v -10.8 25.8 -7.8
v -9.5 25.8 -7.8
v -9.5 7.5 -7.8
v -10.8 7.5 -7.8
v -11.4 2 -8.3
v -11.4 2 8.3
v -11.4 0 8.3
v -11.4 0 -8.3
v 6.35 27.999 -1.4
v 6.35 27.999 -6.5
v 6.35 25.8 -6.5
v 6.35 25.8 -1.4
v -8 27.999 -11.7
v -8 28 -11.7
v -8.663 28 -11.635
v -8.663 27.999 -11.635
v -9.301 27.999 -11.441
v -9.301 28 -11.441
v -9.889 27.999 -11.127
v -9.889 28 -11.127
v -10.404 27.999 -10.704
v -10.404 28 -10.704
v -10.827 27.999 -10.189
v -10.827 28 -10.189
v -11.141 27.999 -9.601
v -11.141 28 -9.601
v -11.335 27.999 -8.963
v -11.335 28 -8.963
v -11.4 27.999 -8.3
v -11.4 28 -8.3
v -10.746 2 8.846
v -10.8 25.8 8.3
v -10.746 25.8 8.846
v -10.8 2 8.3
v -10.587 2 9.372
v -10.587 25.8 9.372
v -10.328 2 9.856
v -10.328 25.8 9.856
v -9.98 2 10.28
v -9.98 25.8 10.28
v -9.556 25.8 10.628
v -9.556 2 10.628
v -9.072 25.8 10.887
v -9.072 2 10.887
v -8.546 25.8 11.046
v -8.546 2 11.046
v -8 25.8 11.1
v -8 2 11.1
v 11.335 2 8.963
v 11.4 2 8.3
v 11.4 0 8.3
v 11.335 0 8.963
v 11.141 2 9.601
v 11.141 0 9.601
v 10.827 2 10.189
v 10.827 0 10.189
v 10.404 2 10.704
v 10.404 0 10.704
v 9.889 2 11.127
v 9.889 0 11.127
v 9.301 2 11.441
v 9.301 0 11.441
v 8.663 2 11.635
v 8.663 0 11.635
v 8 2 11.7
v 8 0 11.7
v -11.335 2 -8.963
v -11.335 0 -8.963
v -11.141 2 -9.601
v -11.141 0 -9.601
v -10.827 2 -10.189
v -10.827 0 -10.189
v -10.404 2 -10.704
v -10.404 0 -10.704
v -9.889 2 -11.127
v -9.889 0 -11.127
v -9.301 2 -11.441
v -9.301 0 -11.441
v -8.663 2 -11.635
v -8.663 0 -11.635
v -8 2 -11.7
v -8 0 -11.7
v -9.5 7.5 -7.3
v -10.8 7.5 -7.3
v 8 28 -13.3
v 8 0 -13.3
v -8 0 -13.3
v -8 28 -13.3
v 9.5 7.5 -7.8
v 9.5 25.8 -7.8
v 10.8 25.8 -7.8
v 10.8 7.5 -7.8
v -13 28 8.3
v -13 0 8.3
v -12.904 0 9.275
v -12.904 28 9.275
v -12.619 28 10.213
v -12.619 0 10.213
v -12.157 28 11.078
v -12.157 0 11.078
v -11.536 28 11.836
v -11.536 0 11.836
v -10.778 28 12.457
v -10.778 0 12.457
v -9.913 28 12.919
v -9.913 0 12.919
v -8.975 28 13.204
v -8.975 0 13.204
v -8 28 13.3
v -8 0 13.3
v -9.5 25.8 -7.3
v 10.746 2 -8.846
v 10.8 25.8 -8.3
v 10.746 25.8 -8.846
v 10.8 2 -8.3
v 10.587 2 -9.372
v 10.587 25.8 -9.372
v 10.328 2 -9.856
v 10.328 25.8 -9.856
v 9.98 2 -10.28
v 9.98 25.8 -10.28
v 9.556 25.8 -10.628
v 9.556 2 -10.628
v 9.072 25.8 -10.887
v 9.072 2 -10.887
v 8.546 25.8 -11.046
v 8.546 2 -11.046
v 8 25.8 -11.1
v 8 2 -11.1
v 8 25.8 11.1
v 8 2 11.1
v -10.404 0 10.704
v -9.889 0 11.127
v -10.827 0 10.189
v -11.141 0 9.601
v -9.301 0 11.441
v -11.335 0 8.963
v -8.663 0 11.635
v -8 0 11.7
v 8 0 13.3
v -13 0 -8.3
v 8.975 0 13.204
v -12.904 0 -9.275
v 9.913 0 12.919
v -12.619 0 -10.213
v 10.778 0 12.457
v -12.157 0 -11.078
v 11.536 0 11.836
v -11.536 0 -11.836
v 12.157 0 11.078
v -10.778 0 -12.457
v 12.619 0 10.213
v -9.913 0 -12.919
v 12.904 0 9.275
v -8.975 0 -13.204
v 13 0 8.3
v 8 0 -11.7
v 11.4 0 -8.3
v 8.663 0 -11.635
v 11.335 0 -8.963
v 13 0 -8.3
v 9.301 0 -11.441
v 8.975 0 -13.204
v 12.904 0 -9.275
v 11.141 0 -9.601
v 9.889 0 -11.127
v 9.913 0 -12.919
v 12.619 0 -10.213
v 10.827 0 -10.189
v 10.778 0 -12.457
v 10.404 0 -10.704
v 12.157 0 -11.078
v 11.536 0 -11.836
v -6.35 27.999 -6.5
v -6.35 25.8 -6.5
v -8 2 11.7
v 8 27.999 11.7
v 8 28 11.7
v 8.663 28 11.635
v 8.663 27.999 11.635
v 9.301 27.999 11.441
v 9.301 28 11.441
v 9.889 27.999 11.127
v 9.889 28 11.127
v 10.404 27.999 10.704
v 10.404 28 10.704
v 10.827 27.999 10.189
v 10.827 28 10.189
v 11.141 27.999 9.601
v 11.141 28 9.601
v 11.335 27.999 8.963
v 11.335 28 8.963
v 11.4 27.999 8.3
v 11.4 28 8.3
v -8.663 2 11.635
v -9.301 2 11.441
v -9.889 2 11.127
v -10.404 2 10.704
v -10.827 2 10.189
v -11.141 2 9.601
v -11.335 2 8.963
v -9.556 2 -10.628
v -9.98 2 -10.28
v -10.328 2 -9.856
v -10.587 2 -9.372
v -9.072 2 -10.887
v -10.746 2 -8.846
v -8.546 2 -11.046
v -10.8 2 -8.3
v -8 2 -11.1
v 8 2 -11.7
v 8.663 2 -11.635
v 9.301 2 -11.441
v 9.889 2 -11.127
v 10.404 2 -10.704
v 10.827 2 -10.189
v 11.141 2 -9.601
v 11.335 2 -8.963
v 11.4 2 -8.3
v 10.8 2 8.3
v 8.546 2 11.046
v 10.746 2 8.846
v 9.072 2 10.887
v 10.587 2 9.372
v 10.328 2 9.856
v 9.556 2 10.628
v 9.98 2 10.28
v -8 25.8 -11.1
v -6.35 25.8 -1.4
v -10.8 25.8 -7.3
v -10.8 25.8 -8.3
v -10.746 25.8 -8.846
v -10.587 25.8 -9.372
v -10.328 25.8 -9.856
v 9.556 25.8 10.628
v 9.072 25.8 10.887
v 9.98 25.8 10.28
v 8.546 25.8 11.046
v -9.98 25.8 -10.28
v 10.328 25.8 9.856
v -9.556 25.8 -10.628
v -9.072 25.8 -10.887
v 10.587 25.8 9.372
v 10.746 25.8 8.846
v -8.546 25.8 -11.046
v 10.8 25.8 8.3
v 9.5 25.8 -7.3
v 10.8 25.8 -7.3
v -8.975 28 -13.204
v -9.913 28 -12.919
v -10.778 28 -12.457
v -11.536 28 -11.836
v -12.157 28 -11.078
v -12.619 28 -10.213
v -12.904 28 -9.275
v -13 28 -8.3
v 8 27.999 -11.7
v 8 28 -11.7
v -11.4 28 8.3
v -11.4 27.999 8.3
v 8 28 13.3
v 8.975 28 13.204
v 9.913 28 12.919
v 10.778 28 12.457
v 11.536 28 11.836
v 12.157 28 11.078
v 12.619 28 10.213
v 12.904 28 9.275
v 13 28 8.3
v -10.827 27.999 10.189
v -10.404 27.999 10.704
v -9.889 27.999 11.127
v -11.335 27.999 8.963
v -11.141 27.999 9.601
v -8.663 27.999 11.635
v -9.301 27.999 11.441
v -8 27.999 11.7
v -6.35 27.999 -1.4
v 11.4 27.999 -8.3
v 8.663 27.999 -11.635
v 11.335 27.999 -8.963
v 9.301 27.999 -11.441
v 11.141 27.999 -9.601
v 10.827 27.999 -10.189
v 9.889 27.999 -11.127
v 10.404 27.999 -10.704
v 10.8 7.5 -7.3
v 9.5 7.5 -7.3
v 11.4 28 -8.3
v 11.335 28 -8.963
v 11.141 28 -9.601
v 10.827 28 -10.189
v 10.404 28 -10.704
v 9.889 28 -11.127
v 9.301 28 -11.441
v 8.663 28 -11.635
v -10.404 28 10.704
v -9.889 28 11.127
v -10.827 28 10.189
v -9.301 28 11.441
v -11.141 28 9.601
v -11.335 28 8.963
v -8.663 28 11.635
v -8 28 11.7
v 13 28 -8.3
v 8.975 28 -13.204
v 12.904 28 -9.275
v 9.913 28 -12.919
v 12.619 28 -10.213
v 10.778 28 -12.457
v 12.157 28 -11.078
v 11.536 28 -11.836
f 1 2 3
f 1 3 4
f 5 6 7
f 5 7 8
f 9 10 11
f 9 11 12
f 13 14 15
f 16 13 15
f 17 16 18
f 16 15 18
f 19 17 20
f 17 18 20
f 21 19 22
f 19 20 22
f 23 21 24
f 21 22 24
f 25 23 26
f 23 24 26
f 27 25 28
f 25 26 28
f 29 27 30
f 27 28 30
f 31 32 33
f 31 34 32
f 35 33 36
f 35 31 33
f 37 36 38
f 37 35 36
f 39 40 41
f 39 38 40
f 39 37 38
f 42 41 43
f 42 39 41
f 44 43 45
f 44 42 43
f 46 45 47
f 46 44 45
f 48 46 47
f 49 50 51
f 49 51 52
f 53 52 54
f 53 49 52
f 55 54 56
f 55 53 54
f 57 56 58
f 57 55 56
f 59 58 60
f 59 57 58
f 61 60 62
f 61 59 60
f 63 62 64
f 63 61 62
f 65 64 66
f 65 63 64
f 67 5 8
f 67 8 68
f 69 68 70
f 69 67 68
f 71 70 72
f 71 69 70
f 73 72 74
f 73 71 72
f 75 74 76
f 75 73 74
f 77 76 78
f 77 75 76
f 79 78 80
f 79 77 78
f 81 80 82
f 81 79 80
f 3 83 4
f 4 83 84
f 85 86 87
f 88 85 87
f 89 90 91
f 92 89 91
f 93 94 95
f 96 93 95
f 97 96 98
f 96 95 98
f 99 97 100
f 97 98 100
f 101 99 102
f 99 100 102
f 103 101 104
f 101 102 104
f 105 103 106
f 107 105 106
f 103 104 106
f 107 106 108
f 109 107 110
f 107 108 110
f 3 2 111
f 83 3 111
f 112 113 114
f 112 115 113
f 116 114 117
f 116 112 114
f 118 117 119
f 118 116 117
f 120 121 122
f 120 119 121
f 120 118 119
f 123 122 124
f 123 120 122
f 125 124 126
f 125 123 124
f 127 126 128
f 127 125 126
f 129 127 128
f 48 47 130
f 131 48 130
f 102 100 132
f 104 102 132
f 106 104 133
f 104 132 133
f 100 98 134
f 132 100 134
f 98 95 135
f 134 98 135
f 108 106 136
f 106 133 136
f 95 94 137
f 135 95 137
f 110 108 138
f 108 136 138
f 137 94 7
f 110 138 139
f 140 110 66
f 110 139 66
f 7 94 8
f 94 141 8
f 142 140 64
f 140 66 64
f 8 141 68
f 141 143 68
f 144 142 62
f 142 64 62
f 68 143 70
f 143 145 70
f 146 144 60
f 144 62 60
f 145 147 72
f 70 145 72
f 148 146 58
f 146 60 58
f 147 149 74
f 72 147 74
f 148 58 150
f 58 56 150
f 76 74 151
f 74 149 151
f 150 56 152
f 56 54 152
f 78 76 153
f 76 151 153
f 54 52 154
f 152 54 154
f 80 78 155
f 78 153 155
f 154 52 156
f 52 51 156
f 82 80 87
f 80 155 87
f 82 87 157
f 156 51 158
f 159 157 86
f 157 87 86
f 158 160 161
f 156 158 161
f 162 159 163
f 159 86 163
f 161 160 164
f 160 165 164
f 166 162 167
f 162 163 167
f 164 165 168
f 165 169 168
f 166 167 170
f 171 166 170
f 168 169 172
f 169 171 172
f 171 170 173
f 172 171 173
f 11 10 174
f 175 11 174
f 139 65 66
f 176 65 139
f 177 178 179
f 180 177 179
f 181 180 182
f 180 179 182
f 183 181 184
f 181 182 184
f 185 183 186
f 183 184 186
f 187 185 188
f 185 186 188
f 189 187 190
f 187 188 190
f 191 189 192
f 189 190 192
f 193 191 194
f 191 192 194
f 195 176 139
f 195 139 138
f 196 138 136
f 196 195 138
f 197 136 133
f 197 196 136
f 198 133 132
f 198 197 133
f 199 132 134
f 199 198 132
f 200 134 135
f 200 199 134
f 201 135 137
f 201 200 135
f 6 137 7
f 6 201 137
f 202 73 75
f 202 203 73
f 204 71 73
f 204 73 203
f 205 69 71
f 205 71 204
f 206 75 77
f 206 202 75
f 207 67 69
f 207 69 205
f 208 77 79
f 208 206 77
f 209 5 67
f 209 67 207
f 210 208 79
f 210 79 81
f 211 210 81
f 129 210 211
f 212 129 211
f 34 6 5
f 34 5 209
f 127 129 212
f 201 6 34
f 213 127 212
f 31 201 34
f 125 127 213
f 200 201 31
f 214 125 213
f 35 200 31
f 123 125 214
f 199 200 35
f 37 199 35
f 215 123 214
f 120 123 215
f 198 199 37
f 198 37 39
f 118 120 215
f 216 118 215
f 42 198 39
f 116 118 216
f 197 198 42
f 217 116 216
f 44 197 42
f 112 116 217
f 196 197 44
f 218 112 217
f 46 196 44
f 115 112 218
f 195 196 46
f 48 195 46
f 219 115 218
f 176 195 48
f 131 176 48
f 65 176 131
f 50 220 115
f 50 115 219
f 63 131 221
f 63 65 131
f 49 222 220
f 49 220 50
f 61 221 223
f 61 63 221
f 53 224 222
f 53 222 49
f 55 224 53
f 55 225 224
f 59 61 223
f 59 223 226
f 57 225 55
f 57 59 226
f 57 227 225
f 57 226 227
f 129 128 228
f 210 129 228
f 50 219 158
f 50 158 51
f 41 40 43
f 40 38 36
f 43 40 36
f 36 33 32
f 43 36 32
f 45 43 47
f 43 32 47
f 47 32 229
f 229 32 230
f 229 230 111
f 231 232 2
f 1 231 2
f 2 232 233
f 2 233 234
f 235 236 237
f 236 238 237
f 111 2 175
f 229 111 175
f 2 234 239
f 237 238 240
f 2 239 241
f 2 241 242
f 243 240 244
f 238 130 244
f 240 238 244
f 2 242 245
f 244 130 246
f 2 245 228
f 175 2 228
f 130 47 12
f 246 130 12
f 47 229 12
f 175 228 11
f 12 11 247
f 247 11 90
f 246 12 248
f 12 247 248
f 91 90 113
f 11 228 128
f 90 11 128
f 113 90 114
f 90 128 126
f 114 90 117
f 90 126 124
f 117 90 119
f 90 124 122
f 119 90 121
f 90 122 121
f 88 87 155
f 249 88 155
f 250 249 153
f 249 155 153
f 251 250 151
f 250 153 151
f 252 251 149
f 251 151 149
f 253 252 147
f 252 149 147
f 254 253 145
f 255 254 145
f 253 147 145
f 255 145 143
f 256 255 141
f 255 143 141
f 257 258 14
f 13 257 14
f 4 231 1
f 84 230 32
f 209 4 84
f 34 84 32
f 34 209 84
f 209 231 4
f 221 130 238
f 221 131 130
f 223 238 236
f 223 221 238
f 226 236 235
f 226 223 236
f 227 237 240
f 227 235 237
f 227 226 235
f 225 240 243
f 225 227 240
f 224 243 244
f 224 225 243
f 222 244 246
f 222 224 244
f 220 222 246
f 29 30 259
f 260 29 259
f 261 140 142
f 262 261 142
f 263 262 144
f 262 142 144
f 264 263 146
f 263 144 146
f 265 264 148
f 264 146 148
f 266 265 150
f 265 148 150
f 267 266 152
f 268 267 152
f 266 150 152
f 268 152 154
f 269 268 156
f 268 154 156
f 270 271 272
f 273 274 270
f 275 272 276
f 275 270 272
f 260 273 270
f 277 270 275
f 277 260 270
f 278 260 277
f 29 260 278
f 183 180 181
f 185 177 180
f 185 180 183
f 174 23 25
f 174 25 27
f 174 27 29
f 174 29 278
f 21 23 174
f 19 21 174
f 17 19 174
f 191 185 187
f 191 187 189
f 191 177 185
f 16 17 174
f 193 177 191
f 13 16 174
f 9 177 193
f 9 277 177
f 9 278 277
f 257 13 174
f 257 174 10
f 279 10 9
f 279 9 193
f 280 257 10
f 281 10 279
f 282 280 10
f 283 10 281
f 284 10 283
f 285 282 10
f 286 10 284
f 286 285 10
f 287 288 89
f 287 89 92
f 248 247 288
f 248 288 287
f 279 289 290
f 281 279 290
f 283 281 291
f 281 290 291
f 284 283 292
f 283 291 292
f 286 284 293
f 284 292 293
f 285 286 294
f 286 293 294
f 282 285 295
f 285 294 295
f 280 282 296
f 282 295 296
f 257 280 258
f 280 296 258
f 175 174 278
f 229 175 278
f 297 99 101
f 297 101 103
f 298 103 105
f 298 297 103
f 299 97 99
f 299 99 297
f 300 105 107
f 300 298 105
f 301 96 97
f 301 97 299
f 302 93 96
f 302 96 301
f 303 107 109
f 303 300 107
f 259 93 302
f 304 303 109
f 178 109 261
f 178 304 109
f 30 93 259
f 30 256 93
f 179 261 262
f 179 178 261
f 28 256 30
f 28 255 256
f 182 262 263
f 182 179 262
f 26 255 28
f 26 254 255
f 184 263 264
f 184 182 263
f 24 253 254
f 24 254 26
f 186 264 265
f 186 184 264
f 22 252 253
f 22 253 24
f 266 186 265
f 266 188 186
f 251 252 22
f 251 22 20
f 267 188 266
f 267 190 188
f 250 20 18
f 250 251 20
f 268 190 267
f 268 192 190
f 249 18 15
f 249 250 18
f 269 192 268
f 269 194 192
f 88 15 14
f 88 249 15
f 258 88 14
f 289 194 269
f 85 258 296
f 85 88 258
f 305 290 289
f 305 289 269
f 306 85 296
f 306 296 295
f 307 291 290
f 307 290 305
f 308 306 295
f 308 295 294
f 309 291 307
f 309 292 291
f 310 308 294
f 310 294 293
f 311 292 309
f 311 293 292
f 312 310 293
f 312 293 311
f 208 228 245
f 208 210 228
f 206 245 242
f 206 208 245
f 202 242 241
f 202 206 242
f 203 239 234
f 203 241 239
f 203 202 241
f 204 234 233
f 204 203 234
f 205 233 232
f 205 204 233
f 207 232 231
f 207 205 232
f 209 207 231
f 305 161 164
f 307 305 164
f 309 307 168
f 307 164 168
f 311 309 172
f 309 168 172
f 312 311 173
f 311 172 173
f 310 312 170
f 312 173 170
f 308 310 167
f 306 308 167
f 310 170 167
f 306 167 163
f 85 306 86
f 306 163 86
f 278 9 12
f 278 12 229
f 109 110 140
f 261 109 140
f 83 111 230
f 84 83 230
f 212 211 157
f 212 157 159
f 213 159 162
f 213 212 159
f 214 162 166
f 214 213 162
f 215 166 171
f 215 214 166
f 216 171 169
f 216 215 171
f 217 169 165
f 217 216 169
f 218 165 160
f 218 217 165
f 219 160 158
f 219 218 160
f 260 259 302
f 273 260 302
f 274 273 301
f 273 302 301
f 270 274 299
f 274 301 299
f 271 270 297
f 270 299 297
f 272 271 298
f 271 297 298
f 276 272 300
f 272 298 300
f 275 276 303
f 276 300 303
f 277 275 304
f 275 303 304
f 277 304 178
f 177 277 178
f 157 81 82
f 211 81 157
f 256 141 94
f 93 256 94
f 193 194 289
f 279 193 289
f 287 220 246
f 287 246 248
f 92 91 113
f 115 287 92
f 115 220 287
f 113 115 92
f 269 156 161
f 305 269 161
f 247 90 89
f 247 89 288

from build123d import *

# Parameters (mm, degrees)
RESSALTO_EXTRUS_O1_DEPTH = 28
CASCA1_T                 = -2.2
ESBO_O2_W                = 12.7
ESBO_O2_H                = 5.1
CORTE_EXTRUS_O1_DEPTH    = 5
CORTE_EXTRUS_O2_DEPTH    = 0.001
CORTE_EXTRUS_O3_START    = -2
CORTE_EXTRUS_O3_DEPTH    = 2
ESBO_O5_W                = 1.3
ESBO_O5_H                = 0.5
RESSALTO_EXTRUS_O2_DEPTH = 18.3


with BuildPart() as part:
    # Esboço1 → Ressalto-extrusão1 (new body)
    with BuildSketch(Plane(origin=(0, 0, 0), x_dir=(1, 0, 0), z_dir=(0, 1, 0))):
        with BuildLine():
            Line((-8, -13.3), (8, -13.3))
            ThreePointArc((8, -13.3), (11.535533906, -11.835533906), (13, -8.3))
            Line((13, -8.3), (13, 8.3))
            ThreePointArc((13, 8.3), (11.535533906, 11.835533906), (8, 13.3))
            Line((8, 13.3), (-8, 13.3))
            ThreePointArc((-8, 13.3), (-11.535533906, 11.835533906), (-13, 8.3))
            Line((-13, 8.3), (-13, -8.3))
            ThreePointArc((-13, -8.3), (-11.535533906, -11.835533906), (-8, -13.3))
        make_face()
    extrude(amount=RESSALTO_EXTRUS_O1_DEPTH)

    # Casca1
    casca1_openings = [part.faces().sort_by_distance(p)[0] for p in [
        (0, 0, 0),
    ]]
    offset(amount=CASCA1_T, openings=casca1_openings, kind=Kind.INTERSECTION)

    # Esboço2 → Corte-extrusão1 (cut)
    with BuildSketch(Plane(origin=(0, 28, 0), x_dir=(-1, 0, 0), z_dir=(0, 1, 0))):
        with Locations((0, -3.95)):
            Rectangle(ESBO_O2_W, ESBO_O2_H)
    extrude(amount=-CORTE_EXTRUS_O1_DEPTH, mode=Mode.SUBTRACT)

    # Esboço3 → Corte-extrusão2 (cut)
    with BuildSketch(Plane(origin=(0, 28, 0), x_dir=(1, 0, 0), z_dir=(0, 1, 0))):
        with BuildLine():
            Line((-8, -11.7), (8, -11.7))
            ThreePointArc((8, -11.7), (10.404163056, -10.704163056), (11.4, -8.3))
            Line((11.4, -8.3), (11.4, 8.3))
            ThreePointArc((11.4, 8.3), (10.404163056, 10.704163056), (8, 11.7))
            Line((8, 11.7), (-8, 11.7))
            ThreePointArc((-8, 11.7), (-10.404163056, 10.704163056), (-11.4, 8.3))
            Line((-11.4, 8.3), (-11.4, -8.3))
            ThreePointArc((-11.4, -8.3), (-10.404163056, -10.704163056), (-8, -11.7))
        make_face()
    extrude(amount=-CORTE_EXTRUS_O2_DEPTH, mode=Mode.SUBTRACT)

    # Esboço4 → Corte-extrusão3 (cut)
    with BuildSketch(Plane.XZ.offset(CORTE_EXTRUS_O3_START)):
        with BuildLine():
            Line((-8, -11.7), (8, -11.7))
            ThreePointArc((8, -11.7), (10.404163056, -10.704163056), (11.4, -8.3))
            Line((11.4, -8.3), (11.4, 8.3))
            ThreePointArc((11.4, 8.3), (10.404163056, 10.704163056), (8, 11.7))
            Line((8, 11.7), (-8, 11.7))
            ThreePointArc((-8, 11.7), (-10.404163056, 10.704163056), (-11.4, 8.3))
            Line((-11.4, 8.3), (-11.4, -8.3))
            ThreePointArc((-11.4, -8.3), (-10.404163056, -10.704163056), (-8, -11.7))
        make_face()
    extrude(amount=CORTE_EXTRUS_O3_DEPTH, mode=Mode.SUBTRACT)

    # Esboço5 → Ressalto-extrusão2 (add)
    with BuildSketch(Plane.XZ.offset(-25.8)):
        with Locations((10.15, -7.55)):
            Rectangle(ESBO_O5_W, ESBO_O5_H)
    ressalto_extrus_o2 = extrude(amount=RESSALTO_EXTRUS_O2_DEPTH)

    # Espelhar1: Ressalto-extrusão2 across plane
    add(ressalto_extrus_o2.mirror(Plane(origin=(0, 0, 0), x_dir=(0, 0, 1), z_dir=(1, 0, 0))))


solid = part.part
